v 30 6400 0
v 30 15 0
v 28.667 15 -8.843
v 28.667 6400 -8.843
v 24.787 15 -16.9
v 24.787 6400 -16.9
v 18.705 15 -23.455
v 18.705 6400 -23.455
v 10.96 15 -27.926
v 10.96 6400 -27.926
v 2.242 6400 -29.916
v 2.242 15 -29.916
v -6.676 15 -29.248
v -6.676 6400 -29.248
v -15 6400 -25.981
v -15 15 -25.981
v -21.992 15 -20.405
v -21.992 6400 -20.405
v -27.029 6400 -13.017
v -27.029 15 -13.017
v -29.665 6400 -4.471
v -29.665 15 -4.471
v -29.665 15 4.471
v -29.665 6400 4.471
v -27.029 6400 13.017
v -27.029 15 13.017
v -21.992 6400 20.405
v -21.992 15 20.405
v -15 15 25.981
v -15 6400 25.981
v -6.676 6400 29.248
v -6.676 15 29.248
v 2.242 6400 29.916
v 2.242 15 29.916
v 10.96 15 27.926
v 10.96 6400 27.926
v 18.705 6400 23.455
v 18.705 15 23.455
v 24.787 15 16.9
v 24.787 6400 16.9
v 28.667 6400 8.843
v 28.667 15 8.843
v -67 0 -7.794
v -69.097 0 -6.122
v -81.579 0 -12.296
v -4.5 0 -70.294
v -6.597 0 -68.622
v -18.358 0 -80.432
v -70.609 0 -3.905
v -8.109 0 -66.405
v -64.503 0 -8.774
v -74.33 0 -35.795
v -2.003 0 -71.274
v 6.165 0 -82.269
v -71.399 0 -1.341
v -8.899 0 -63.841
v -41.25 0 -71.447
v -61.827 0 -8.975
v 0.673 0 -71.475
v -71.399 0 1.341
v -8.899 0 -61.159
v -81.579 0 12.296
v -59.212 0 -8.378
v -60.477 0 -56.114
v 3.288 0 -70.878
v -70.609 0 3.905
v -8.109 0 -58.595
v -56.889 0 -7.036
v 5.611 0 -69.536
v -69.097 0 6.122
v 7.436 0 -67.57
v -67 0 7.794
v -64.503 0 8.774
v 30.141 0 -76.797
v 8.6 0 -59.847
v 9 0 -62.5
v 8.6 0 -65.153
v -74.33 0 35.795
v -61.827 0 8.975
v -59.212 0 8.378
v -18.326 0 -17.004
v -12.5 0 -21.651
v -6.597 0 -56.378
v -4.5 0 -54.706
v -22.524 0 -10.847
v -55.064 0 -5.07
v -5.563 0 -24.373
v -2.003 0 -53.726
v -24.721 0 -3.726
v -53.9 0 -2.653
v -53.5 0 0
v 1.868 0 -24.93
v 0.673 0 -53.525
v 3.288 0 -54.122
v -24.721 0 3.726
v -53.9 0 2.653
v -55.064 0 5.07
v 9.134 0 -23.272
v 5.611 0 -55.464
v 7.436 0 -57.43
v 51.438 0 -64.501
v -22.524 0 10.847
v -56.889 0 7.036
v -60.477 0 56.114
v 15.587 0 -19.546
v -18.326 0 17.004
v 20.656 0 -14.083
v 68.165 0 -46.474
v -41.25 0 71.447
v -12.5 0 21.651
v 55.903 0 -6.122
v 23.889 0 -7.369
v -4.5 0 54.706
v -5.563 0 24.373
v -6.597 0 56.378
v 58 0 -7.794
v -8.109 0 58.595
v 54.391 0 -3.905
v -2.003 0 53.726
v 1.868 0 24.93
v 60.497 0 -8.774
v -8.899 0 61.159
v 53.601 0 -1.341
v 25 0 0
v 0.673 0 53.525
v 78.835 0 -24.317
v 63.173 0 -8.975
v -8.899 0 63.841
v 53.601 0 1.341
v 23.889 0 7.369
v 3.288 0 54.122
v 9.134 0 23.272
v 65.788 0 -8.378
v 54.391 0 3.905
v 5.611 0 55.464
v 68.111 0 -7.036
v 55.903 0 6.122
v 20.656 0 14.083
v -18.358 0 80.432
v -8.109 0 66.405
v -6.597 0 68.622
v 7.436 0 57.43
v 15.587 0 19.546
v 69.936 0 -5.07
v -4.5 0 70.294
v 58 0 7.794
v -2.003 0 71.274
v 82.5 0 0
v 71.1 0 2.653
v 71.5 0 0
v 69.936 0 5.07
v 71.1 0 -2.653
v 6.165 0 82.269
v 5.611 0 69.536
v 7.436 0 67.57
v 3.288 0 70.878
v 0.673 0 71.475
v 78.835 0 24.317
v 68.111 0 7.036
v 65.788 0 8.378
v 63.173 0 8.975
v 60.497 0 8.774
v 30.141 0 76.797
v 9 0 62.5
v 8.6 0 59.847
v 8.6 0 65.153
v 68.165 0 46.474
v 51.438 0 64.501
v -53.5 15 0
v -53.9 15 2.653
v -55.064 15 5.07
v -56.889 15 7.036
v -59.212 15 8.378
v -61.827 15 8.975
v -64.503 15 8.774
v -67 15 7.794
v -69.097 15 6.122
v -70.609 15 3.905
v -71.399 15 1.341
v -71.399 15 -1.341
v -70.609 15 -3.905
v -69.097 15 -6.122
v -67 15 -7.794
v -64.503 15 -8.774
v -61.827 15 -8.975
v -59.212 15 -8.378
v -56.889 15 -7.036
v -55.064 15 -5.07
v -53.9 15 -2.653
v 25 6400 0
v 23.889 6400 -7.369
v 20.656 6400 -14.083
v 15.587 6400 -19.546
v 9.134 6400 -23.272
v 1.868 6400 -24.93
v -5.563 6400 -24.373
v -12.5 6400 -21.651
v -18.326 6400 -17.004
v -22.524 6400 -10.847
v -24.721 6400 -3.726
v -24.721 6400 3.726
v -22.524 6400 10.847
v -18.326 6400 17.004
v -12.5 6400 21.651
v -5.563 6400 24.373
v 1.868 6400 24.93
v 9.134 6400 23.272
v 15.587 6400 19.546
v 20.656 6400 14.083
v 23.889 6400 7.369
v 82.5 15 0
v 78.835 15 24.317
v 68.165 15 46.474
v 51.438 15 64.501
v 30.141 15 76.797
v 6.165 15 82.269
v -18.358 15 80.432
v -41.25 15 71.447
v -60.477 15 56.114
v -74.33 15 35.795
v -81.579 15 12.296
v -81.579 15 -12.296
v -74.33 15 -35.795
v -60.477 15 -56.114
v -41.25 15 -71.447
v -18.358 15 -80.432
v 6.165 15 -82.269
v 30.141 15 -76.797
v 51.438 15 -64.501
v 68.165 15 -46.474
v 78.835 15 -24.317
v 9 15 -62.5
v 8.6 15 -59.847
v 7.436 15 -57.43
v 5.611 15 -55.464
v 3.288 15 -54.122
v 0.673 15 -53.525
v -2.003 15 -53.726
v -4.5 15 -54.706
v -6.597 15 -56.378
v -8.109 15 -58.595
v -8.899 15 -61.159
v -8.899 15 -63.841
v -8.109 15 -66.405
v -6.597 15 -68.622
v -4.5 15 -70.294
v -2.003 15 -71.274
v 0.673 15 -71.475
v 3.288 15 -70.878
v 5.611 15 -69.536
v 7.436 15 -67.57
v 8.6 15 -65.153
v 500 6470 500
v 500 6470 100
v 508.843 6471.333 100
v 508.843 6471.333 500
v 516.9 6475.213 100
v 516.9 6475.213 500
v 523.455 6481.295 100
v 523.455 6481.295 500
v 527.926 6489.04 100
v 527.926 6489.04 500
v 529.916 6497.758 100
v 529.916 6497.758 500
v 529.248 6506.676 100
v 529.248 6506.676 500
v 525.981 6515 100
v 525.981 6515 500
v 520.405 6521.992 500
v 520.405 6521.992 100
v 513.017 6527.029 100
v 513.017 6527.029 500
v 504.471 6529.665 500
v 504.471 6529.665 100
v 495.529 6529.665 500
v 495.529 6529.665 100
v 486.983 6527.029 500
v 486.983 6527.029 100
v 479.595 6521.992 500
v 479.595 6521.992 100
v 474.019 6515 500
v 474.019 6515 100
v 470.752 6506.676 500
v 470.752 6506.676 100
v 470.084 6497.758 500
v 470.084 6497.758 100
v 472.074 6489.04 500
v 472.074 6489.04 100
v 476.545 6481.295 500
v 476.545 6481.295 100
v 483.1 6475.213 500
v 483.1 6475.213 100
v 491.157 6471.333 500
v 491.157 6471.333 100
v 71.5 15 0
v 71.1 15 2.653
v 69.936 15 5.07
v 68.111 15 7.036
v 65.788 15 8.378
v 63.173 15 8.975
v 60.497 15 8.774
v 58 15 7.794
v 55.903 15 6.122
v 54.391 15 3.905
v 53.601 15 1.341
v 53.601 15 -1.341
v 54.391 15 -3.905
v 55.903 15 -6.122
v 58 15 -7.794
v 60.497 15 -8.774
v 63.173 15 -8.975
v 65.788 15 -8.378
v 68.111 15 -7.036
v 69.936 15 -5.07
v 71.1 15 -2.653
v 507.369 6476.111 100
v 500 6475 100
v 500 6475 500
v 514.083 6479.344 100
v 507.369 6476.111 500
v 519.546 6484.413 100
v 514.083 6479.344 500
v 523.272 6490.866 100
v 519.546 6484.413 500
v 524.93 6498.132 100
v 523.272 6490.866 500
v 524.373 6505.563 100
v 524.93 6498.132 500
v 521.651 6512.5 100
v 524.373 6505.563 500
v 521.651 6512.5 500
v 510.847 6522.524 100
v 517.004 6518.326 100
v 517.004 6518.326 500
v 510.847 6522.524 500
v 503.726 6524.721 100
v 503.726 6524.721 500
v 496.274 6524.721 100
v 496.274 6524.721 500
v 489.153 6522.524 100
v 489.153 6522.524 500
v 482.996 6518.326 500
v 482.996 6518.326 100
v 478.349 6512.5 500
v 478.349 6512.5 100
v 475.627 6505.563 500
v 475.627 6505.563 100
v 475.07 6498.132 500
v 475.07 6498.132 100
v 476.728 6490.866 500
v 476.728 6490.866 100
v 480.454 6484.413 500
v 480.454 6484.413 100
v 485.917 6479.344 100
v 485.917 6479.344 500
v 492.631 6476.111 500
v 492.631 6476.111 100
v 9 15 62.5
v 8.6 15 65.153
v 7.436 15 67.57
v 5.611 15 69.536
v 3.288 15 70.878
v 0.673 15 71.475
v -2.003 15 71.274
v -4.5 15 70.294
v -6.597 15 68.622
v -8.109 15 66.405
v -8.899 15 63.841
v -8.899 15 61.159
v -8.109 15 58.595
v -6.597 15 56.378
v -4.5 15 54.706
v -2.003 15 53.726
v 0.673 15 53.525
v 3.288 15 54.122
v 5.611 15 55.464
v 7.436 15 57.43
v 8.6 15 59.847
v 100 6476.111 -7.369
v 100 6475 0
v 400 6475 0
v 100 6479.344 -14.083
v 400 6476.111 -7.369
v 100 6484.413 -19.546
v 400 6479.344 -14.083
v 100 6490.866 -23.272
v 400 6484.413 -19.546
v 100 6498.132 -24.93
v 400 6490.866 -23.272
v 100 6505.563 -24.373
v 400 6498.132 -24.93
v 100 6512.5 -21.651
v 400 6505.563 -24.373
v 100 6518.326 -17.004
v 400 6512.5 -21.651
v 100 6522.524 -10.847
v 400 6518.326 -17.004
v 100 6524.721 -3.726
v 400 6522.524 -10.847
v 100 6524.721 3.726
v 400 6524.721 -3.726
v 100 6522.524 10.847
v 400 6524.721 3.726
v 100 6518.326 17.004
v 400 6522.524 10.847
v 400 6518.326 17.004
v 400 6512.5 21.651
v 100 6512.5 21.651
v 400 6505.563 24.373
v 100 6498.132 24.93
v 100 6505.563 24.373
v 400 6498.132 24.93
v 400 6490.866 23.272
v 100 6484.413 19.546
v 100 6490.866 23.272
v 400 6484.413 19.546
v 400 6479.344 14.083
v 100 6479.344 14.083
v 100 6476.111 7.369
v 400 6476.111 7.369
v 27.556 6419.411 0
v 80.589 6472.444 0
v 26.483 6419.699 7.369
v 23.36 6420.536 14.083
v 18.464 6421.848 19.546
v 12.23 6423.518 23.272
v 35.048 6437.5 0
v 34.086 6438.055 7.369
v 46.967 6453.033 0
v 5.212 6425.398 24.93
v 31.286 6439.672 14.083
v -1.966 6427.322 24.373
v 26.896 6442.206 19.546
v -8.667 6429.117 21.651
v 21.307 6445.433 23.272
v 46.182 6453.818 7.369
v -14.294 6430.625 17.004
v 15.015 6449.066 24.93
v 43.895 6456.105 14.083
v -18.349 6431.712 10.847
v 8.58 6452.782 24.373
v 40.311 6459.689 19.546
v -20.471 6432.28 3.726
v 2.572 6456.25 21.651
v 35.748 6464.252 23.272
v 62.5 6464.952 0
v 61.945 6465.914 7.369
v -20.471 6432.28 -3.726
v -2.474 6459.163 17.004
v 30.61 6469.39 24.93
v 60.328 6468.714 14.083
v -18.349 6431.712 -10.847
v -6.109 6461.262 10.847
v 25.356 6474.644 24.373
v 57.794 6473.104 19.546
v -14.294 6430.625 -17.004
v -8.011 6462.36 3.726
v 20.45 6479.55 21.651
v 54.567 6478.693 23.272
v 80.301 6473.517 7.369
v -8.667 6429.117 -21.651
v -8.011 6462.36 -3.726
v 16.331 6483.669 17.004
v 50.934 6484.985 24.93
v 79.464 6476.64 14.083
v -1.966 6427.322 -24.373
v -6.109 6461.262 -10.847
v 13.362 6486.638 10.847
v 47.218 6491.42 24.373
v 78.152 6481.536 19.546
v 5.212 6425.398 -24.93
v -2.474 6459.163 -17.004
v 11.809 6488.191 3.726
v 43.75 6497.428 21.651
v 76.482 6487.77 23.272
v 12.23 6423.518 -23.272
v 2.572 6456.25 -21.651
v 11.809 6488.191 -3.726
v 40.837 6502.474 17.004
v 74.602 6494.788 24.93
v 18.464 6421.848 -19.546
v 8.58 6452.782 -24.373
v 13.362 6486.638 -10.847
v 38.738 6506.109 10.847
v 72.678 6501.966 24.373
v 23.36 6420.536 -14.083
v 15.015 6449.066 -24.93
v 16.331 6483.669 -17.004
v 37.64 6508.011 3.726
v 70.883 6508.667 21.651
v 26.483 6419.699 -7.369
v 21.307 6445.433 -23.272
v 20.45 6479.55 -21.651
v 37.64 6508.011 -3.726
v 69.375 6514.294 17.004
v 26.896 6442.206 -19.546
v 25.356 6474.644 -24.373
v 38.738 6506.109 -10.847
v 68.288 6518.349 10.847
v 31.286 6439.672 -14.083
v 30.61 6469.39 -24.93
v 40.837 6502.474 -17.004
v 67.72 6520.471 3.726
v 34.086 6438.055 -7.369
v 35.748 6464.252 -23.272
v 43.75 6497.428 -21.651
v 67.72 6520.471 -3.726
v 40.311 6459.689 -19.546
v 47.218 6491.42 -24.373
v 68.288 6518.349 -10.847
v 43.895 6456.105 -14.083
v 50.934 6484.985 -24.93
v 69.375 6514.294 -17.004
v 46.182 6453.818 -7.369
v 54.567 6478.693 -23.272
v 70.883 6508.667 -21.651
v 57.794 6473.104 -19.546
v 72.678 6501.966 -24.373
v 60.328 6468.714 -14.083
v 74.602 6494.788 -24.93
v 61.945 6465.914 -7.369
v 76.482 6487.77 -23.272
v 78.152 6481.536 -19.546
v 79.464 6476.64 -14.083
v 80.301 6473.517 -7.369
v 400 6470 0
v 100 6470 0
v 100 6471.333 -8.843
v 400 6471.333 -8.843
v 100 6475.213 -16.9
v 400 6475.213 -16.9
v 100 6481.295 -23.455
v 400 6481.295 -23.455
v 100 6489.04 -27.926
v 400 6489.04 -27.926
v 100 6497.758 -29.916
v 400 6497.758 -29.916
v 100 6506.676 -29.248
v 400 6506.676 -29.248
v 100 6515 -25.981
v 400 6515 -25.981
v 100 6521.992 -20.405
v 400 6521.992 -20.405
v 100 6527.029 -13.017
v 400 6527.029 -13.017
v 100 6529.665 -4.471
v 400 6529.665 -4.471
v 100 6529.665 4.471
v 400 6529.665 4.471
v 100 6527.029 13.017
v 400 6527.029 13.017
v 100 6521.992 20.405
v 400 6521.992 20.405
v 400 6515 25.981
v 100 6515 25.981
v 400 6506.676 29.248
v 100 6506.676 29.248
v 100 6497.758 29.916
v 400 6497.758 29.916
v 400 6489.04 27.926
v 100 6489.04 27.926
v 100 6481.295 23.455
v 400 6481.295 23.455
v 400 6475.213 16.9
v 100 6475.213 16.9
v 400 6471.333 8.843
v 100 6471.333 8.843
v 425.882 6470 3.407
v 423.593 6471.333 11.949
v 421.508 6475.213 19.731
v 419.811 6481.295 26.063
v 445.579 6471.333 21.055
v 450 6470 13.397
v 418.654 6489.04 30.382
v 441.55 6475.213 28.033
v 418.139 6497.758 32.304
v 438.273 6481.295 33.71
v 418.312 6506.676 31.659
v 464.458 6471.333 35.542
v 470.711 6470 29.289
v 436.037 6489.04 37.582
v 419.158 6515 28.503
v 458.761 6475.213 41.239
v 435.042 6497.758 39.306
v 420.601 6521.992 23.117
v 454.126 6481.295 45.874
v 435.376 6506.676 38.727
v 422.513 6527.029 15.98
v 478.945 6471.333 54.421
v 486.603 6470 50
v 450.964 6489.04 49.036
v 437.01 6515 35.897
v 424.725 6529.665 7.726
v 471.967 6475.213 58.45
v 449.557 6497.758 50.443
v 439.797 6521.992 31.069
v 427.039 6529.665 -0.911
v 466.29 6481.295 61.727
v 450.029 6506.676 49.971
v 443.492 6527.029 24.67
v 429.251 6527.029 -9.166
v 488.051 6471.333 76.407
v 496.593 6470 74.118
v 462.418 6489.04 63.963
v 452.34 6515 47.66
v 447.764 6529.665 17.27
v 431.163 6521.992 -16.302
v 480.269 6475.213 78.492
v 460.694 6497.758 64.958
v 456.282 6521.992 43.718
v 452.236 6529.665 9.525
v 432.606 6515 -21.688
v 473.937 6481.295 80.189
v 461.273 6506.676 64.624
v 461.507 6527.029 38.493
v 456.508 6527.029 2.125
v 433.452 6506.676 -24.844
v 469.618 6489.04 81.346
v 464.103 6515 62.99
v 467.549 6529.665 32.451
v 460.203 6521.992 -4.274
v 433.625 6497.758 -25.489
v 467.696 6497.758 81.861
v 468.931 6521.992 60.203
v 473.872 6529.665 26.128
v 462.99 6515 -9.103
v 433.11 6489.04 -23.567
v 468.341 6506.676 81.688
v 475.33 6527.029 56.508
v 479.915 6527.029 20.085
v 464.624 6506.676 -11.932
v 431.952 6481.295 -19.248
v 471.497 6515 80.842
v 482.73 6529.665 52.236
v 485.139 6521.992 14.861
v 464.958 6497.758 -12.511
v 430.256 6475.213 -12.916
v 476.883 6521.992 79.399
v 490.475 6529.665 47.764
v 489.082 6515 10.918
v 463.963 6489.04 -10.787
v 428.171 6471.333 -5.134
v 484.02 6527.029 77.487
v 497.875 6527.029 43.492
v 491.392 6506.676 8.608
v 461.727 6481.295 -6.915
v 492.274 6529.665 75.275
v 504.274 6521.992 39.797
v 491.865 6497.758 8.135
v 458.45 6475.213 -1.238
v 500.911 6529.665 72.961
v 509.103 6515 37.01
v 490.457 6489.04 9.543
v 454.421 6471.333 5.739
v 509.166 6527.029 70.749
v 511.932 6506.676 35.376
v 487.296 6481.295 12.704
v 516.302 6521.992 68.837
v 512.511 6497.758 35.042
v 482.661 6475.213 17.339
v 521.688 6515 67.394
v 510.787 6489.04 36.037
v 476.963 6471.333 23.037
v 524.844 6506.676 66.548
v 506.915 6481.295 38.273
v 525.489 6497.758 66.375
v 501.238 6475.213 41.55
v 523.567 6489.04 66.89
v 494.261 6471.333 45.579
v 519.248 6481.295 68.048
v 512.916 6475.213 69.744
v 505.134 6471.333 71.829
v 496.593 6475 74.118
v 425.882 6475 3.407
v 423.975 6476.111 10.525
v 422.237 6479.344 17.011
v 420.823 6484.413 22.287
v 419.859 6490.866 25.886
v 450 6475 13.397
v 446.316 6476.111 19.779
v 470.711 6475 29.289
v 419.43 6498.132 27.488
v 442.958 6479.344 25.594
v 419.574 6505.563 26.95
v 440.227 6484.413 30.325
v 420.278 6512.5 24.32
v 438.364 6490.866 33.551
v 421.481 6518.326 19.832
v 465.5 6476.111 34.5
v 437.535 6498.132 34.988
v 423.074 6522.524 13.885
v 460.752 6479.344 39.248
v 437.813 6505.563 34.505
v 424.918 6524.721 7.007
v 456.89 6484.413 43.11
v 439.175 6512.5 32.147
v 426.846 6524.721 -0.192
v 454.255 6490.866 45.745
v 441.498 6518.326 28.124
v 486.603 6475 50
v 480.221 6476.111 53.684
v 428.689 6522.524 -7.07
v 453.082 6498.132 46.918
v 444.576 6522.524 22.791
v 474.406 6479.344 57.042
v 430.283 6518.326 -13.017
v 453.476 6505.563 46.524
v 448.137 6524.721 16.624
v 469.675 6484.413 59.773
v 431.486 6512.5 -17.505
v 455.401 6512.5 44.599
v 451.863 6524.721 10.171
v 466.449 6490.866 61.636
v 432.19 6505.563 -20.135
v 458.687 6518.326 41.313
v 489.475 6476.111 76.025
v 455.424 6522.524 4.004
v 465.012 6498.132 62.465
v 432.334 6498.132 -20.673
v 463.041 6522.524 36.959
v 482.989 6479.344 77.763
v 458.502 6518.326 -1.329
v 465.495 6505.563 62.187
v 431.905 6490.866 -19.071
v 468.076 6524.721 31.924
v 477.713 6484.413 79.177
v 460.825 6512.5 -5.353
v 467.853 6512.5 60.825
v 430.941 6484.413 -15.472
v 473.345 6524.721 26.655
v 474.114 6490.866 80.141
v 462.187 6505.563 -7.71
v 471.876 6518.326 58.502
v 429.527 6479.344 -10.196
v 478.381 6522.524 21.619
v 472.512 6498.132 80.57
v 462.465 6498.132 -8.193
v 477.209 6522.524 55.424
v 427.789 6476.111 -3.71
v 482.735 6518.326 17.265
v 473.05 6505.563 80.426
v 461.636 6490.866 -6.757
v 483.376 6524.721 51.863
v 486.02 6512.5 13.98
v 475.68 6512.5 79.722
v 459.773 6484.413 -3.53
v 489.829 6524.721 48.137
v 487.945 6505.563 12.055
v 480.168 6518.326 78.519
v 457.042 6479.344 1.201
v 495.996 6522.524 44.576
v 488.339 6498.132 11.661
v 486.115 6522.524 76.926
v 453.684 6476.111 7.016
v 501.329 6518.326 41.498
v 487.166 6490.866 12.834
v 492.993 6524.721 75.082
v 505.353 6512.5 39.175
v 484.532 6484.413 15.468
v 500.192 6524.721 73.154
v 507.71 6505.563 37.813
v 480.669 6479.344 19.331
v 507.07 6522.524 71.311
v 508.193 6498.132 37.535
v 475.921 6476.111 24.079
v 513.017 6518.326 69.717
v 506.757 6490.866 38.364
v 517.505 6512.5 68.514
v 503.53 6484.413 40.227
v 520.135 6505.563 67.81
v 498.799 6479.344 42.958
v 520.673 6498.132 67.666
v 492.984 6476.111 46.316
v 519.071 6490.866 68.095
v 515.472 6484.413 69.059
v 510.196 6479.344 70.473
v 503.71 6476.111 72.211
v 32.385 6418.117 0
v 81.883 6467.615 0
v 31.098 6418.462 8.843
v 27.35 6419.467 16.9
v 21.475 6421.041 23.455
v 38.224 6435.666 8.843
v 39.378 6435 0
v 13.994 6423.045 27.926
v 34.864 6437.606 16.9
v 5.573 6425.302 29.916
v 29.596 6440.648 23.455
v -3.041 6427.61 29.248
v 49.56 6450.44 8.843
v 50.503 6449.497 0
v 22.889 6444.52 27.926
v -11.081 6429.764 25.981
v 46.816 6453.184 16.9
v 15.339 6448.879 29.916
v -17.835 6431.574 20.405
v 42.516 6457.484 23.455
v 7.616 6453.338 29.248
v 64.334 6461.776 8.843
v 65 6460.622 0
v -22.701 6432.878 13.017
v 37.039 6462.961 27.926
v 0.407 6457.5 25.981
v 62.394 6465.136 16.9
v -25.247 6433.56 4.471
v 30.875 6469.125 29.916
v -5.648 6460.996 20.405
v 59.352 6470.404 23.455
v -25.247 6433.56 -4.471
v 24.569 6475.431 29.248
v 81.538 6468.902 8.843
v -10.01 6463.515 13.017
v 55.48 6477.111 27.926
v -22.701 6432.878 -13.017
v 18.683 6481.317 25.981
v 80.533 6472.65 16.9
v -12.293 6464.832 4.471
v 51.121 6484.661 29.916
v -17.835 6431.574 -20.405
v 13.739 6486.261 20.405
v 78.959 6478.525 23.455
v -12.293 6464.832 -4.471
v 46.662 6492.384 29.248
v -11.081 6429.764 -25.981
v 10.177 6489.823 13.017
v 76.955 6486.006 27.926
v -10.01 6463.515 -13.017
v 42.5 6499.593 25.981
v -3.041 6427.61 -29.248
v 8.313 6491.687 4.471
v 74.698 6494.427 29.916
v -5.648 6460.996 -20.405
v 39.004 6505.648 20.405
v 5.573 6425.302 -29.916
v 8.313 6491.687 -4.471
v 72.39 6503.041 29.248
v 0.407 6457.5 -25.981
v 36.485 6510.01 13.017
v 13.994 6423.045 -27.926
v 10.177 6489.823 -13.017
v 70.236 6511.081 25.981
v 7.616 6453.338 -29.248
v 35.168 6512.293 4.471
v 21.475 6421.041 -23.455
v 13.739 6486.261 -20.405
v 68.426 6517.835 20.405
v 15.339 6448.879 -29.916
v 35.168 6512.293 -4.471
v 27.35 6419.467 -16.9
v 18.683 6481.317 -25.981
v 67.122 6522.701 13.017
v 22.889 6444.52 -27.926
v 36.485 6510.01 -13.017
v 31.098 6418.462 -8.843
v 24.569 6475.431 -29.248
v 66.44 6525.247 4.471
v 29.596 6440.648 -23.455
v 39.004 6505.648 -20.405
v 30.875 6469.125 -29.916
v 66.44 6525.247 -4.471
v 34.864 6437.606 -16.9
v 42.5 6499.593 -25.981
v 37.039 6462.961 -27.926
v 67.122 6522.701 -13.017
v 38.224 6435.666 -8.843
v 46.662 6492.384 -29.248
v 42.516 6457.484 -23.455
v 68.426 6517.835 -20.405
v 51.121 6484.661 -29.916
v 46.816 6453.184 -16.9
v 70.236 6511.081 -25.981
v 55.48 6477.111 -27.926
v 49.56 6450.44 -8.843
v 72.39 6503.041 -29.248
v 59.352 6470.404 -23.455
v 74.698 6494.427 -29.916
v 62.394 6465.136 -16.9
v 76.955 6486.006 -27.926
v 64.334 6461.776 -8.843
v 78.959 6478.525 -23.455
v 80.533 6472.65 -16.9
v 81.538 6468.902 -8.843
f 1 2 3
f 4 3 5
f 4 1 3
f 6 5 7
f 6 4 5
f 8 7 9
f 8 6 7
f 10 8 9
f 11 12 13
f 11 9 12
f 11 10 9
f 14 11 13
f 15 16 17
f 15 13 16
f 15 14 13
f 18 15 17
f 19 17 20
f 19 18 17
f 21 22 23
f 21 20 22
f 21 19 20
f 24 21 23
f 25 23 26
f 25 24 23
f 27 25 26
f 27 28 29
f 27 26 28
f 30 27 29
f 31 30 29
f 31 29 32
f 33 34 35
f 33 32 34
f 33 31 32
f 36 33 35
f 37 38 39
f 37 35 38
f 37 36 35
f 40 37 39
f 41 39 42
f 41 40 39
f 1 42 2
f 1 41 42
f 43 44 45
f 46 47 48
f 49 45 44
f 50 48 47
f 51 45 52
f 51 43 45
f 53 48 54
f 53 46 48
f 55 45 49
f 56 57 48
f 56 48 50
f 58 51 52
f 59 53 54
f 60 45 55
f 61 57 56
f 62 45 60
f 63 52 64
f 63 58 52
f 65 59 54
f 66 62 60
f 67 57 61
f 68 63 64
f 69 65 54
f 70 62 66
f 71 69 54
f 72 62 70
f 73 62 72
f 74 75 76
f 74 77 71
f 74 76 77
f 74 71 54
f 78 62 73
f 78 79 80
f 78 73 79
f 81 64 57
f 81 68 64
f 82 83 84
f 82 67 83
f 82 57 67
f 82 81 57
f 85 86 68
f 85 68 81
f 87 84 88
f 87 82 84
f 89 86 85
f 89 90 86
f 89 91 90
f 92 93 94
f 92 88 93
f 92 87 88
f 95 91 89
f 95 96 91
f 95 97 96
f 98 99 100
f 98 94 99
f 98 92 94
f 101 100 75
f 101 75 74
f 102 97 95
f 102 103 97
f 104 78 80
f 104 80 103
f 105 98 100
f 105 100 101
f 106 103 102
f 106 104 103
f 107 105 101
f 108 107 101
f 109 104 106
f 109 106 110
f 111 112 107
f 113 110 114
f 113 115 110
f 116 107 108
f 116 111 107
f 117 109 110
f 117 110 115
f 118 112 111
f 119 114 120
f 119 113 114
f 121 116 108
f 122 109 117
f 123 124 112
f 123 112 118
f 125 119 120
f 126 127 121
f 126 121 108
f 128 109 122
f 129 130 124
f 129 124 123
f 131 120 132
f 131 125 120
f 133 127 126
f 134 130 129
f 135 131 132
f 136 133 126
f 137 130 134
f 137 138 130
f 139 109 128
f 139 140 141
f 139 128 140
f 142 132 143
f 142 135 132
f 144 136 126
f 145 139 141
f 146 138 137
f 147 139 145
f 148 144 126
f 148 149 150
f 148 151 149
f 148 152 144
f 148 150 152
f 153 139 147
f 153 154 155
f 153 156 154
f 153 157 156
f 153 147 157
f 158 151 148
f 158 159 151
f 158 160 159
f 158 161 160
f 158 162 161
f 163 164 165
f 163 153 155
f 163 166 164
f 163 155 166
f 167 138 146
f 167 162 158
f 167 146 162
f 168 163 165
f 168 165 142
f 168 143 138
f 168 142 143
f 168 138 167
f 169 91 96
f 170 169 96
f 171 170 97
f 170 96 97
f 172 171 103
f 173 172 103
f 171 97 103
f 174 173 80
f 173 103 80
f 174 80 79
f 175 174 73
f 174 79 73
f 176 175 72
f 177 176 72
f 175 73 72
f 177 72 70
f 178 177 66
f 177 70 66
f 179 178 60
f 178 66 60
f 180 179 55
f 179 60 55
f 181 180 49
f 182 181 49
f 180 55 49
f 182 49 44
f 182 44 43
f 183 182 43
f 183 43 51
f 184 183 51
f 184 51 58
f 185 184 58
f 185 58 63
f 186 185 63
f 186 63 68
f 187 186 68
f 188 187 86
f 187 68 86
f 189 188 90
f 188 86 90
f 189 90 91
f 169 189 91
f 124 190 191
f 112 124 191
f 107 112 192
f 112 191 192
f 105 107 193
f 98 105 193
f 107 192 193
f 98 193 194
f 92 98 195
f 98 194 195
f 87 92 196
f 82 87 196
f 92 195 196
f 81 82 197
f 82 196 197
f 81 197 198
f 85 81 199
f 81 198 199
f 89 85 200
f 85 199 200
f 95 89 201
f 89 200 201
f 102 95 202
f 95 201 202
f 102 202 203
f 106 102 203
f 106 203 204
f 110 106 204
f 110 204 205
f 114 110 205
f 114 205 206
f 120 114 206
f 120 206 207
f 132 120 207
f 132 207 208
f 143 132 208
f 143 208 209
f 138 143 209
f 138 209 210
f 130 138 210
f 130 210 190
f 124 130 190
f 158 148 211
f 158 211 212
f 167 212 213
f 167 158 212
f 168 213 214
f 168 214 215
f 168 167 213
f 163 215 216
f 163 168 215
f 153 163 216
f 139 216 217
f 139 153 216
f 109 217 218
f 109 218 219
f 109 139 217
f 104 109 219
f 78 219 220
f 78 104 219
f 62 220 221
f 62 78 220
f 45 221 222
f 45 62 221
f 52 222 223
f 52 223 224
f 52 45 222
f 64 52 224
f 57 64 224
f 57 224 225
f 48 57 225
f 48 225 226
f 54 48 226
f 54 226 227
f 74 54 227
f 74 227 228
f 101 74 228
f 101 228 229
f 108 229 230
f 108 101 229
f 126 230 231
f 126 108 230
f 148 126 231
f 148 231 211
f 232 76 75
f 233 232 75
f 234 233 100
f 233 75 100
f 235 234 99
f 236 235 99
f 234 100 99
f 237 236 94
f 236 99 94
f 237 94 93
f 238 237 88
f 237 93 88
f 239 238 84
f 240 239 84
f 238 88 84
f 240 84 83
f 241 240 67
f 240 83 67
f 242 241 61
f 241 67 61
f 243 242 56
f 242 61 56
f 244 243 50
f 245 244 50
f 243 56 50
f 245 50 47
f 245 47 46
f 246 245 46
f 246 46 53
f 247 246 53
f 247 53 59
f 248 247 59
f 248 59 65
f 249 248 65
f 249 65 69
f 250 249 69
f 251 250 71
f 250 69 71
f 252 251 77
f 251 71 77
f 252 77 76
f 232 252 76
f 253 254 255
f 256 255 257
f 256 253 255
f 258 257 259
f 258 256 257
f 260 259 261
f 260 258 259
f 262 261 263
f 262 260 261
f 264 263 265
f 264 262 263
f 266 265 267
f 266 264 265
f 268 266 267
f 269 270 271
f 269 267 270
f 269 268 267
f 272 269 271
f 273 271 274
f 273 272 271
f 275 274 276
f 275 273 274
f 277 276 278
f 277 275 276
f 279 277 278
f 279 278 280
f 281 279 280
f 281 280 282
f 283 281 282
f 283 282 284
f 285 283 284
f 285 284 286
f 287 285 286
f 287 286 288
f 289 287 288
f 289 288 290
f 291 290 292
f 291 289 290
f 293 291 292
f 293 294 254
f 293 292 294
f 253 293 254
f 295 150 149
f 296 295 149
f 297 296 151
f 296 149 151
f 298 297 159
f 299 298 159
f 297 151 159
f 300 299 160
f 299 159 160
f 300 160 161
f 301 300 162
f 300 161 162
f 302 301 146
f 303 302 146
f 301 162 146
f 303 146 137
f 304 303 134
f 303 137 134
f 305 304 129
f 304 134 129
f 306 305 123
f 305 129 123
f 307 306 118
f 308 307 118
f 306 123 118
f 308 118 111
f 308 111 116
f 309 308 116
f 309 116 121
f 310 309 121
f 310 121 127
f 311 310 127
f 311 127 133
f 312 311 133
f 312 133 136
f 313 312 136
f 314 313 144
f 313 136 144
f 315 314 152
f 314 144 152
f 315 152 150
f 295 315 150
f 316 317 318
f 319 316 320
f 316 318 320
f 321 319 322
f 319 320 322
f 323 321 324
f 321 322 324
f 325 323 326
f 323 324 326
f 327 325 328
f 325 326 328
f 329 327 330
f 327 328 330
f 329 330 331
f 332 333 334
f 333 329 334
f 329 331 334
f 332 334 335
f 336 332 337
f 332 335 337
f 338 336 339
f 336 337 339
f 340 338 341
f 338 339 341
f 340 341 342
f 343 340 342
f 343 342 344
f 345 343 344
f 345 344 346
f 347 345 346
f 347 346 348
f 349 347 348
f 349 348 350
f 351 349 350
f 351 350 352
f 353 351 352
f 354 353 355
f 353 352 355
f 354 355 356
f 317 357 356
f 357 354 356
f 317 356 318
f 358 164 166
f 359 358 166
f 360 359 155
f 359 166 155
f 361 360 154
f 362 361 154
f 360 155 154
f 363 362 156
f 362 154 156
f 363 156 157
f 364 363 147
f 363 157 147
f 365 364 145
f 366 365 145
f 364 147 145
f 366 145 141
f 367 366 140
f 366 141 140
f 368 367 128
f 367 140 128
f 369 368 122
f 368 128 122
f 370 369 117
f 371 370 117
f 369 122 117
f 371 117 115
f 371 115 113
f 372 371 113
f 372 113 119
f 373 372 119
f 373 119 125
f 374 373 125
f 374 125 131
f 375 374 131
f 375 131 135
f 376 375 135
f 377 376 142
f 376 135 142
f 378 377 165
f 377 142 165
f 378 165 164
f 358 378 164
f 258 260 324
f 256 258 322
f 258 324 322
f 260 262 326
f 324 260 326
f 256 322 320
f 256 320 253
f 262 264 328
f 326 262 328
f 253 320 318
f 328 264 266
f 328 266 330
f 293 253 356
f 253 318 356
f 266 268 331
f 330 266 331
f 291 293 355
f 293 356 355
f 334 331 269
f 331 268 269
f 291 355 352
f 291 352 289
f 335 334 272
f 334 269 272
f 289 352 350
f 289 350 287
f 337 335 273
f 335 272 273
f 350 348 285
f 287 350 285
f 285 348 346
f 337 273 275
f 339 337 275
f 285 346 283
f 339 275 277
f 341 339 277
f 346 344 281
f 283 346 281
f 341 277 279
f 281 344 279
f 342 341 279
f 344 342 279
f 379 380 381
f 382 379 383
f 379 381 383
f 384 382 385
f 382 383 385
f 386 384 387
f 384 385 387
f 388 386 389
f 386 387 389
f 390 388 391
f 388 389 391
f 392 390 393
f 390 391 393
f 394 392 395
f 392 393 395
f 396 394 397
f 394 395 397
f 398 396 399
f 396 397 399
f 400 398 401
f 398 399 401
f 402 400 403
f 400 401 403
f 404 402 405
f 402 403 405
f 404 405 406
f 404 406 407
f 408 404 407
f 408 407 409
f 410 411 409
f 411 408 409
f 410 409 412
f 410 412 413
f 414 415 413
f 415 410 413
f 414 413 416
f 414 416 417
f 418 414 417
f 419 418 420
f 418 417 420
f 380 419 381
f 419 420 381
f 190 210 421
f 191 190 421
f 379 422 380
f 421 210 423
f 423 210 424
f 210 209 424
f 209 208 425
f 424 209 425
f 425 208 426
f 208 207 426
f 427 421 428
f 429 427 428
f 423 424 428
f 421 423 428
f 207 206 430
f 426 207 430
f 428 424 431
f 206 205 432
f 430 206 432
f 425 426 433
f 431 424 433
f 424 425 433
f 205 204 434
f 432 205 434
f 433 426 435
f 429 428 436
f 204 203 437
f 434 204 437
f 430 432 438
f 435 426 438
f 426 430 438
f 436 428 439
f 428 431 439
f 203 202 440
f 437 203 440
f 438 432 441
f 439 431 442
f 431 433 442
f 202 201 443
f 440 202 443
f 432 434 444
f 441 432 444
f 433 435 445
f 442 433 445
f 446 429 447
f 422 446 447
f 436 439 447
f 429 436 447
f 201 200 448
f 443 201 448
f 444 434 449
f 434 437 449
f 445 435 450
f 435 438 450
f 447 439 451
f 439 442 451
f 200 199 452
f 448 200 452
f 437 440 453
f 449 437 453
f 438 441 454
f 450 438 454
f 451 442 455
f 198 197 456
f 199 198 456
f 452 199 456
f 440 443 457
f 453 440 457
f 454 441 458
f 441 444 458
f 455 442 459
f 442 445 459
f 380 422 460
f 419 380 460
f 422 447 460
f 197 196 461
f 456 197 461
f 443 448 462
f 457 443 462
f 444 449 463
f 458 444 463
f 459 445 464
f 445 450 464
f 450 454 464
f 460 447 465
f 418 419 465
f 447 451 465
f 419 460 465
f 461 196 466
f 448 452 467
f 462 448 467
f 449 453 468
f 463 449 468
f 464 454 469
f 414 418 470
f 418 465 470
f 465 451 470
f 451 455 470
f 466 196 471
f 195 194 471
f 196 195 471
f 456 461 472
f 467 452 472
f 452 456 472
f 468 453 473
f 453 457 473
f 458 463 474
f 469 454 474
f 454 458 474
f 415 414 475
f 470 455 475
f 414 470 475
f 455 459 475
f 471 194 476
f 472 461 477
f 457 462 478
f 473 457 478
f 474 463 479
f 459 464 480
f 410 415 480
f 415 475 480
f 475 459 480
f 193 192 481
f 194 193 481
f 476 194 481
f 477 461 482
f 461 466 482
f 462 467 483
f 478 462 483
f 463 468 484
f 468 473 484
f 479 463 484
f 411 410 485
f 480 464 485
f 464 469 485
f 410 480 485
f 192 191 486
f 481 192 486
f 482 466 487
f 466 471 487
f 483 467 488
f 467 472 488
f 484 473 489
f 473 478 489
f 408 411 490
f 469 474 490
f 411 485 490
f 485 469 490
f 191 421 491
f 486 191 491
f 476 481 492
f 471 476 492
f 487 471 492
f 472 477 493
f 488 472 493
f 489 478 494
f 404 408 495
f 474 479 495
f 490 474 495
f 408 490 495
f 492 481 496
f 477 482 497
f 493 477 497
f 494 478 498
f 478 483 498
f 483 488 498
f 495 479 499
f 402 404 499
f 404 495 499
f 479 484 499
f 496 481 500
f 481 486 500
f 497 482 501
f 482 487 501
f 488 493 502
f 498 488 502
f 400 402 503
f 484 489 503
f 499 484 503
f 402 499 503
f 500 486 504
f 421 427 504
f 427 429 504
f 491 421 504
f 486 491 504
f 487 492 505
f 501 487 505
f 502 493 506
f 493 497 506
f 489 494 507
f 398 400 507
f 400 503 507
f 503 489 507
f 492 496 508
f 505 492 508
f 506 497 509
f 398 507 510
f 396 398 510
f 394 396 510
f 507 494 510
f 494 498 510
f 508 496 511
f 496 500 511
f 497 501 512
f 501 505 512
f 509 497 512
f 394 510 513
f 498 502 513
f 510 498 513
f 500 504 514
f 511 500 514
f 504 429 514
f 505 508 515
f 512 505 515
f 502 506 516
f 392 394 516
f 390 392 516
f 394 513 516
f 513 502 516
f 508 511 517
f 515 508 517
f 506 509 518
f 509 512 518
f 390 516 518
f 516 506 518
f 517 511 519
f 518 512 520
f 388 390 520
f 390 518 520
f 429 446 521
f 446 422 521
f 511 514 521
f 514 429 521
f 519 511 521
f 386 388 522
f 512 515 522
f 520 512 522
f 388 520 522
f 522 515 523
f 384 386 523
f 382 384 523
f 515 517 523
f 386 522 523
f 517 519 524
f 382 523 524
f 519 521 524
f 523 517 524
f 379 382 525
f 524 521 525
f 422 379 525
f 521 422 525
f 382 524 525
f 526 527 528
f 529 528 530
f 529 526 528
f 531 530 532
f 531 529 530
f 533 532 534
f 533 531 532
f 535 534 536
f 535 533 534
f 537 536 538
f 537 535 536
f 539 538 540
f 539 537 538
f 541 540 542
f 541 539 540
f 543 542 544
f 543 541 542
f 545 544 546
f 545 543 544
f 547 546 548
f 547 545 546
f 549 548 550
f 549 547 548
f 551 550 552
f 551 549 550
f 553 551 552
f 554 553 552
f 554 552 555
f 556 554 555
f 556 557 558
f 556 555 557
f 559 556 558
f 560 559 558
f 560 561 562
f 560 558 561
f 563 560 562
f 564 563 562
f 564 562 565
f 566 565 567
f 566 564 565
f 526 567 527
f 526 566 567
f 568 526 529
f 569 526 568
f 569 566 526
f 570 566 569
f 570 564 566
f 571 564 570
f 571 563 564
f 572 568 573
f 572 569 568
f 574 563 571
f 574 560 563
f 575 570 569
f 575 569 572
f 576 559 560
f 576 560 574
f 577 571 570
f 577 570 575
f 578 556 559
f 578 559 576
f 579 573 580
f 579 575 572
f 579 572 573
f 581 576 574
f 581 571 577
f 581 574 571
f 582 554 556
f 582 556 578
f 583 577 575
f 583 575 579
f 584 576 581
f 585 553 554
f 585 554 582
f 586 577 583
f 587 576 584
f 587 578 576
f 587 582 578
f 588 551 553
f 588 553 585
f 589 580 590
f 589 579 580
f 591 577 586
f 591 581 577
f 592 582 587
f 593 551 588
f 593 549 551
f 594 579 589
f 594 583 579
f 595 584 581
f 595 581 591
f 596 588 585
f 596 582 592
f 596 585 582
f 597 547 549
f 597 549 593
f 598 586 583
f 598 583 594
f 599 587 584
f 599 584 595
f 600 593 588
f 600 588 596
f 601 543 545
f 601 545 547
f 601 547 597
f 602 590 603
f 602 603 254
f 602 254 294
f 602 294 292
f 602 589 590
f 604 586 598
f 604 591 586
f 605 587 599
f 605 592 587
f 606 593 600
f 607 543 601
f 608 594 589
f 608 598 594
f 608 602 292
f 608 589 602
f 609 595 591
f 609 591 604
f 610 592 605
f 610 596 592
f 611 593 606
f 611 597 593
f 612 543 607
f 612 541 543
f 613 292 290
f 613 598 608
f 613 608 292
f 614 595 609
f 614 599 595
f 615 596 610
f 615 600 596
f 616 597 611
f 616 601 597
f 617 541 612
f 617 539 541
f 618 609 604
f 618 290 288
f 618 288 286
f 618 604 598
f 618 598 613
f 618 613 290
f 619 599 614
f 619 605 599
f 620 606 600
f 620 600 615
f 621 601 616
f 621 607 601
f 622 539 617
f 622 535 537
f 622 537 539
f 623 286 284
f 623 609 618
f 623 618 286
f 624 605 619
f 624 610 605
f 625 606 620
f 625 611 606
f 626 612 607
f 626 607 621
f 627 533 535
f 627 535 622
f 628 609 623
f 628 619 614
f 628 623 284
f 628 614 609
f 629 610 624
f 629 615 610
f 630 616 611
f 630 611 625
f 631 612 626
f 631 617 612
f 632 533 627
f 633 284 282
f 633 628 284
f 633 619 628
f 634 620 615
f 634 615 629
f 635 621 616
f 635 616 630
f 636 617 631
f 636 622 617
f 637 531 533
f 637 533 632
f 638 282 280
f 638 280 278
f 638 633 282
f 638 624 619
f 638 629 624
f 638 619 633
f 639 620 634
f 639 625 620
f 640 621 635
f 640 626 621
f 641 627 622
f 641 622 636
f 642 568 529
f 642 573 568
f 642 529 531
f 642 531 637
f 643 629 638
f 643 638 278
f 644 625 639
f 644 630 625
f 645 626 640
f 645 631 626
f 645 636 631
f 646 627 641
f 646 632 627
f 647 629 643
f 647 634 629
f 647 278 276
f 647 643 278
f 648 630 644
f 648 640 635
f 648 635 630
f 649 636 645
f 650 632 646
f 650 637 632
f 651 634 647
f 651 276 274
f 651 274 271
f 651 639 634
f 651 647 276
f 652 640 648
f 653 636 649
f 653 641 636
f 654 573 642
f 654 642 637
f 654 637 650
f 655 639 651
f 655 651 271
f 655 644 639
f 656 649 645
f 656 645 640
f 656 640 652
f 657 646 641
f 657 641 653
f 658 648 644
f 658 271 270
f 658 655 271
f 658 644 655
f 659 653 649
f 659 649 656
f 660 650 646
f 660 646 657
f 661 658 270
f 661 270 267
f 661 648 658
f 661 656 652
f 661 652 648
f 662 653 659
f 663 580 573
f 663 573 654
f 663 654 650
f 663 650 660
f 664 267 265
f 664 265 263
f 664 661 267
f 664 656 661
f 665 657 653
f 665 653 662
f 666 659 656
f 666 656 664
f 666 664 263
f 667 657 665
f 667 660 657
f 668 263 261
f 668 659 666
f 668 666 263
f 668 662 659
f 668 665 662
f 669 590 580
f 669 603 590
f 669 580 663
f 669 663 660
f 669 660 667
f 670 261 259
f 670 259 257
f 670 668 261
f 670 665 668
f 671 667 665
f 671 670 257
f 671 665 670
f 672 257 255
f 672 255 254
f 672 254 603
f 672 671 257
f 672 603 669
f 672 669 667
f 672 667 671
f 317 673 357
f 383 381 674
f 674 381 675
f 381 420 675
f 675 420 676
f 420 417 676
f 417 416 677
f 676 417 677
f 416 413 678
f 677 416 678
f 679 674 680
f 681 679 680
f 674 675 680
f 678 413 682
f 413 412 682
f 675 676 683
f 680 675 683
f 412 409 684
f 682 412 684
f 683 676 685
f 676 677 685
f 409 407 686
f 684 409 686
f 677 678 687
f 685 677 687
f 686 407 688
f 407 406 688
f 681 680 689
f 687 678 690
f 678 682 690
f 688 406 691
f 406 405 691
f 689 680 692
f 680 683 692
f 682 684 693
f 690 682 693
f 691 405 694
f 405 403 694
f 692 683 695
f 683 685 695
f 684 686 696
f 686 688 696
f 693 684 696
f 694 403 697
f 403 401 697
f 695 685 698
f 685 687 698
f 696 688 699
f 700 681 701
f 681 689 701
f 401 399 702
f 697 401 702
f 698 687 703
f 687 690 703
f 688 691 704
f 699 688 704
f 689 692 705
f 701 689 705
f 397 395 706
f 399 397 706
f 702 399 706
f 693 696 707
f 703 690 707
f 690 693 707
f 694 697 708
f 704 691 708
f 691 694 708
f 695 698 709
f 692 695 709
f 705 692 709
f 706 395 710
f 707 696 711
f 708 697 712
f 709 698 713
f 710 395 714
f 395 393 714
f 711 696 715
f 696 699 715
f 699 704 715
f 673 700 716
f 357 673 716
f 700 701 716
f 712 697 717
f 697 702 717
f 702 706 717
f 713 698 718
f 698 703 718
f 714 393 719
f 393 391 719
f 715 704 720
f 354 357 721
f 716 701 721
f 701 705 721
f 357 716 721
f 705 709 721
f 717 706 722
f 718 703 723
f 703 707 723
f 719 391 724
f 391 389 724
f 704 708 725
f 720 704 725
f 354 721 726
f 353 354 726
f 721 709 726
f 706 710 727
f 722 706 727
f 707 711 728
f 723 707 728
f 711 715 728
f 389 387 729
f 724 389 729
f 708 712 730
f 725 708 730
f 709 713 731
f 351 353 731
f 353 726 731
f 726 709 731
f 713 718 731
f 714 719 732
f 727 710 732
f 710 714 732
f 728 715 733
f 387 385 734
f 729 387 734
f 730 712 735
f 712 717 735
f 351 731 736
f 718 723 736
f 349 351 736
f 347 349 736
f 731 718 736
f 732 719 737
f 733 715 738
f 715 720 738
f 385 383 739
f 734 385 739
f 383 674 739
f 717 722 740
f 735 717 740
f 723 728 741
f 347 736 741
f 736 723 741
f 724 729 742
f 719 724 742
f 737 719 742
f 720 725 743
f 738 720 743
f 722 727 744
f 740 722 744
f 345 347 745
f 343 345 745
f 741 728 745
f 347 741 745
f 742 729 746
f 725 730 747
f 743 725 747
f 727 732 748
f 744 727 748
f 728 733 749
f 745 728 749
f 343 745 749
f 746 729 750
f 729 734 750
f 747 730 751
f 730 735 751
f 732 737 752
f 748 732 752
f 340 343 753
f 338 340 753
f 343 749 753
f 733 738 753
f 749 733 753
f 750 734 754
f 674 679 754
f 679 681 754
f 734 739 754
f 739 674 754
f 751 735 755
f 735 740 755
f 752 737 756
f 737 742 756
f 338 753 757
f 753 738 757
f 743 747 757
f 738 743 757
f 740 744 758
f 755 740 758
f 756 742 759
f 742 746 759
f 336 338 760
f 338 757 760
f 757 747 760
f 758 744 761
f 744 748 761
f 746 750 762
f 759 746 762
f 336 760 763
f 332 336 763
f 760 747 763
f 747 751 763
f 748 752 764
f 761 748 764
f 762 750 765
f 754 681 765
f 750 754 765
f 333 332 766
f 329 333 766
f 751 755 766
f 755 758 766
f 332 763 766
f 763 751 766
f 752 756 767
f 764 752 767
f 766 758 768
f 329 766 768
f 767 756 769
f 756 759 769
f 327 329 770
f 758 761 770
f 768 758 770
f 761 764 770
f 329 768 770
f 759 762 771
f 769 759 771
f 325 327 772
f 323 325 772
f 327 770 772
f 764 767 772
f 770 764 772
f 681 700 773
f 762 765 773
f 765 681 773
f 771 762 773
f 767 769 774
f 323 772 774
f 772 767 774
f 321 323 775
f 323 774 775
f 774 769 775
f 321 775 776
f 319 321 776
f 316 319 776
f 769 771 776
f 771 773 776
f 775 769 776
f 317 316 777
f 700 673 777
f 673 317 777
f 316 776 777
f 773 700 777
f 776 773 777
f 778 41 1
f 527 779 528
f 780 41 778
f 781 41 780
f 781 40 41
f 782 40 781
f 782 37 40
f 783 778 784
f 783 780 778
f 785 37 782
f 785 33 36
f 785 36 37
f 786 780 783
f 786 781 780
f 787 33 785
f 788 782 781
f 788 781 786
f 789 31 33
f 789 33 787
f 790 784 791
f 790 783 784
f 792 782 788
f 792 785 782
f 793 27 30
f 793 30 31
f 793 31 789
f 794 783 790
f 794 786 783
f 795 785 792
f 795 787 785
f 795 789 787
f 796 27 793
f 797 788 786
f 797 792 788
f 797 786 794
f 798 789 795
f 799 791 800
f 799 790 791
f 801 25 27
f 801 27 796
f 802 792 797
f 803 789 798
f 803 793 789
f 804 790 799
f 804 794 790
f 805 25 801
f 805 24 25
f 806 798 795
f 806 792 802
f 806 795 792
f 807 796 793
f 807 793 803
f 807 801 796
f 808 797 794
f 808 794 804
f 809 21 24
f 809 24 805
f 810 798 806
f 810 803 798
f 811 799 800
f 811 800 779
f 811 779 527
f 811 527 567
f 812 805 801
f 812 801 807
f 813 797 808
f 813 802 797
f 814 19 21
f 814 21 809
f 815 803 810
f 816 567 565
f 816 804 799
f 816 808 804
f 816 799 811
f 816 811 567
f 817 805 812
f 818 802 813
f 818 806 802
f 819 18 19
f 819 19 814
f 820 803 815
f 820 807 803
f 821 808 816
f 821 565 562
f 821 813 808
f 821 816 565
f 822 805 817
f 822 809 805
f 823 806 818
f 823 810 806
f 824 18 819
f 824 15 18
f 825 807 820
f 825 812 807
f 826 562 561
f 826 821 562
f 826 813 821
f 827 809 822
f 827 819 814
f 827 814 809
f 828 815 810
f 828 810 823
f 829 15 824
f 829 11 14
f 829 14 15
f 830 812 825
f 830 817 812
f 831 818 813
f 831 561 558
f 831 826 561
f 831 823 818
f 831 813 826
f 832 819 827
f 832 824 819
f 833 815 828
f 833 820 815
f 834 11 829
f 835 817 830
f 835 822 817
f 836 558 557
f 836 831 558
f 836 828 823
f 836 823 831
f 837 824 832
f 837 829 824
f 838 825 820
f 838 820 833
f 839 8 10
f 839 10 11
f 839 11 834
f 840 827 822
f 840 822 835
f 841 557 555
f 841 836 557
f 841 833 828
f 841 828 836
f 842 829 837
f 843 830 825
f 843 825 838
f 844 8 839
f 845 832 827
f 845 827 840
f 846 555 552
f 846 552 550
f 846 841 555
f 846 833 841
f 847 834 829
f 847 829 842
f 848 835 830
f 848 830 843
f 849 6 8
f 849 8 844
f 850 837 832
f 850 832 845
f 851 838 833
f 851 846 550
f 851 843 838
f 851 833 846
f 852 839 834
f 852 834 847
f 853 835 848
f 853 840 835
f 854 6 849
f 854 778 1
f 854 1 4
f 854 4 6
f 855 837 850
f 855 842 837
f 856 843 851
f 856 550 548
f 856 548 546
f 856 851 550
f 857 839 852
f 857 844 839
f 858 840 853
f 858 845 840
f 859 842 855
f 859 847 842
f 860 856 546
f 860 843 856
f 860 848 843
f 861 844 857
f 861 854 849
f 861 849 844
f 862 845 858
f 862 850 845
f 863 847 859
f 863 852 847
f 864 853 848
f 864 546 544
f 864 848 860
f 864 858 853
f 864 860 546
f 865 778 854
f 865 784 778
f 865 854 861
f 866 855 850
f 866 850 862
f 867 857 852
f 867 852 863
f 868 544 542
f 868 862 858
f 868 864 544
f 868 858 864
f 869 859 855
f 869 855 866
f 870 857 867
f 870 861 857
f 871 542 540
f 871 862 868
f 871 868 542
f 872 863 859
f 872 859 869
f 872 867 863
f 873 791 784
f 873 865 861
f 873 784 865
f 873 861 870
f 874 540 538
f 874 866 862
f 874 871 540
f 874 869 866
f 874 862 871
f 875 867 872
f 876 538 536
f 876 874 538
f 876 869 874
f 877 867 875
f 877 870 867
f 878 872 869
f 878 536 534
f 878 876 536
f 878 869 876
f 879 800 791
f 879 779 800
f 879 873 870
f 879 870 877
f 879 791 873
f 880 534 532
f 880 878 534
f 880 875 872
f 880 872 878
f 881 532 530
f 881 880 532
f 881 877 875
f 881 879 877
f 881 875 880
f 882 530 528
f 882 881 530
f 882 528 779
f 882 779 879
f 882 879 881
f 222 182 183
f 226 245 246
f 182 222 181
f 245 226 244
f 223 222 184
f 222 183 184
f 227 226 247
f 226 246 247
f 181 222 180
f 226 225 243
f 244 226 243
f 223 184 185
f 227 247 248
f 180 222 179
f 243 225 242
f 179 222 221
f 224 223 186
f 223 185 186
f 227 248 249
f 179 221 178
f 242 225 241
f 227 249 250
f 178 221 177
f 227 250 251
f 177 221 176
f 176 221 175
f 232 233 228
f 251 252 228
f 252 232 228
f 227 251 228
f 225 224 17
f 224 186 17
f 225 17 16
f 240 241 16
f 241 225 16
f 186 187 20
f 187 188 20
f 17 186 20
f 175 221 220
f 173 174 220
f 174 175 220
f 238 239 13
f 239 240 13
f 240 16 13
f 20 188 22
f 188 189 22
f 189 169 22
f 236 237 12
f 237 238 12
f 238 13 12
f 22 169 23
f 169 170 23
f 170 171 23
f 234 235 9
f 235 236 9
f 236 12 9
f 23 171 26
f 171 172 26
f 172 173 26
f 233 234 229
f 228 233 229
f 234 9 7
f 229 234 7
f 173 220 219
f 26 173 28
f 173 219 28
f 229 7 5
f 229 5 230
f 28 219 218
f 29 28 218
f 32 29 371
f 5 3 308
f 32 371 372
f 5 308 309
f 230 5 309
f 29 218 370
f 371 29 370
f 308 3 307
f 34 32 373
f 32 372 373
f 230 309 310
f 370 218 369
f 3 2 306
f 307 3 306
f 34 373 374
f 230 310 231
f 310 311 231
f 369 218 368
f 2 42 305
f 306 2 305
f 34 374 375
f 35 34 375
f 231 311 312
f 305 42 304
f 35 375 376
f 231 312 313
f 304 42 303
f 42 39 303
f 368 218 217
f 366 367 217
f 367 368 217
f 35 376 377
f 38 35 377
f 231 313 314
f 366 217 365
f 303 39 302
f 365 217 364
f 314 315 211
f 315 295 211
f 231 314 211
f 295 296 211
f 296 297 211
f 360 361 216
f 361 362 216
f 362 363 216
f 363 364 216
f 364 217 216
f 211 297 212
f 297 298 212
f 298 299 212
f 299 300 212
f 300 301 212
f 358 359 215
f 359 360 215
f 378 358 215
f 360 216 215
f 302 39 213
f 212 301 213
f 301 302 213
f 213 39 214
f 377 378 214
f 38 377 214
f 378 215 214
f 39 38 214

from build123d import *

# Parameters (mm, degrees)
F0_R     = 30
F0_R_2   = 25
F0_R_3   = 82.5
F0_R_4   = 9
F5_DEPTH = 15


with BuildPart() as f4:
    # F4: sweep along a path in F1, F3
    with BuildLine(Plane.XY) as f4_path:
        Line((0, 0), (0, 6400))
        ThreePointArc((0, 6400), (29.2893218813, 6470.7106781187), (100, 6500))
    with BuildLine(Plane.XZ.offset(-6500)) as f4_path_2:
        Line((100, 0), (400, 0))
        ThreePointArc((400, 0), (470.7106781187, 29.2893218813), (500, 100))
        Line((500, 100), (500, 500))
    # F0 (on Front) → F4 (sweep)
    with BuildSketch(Plane.XZ):
        Circle(F0_R)
        Circle(F0_R_2, mode=Mode.SUBTRACT)
    sweep(path=f4_path.line + f4_path_2.line)

    # F0 (on Front) → F5 (join)
    with BuildSketch(Plane.XZ):
        Circle(F0_R_3)
        with Locations((0, -62.5)):
            Circle(F0_R_4, mode=Mode.SUBTRACT)
        with Locations((-62.5, 0)):
            Circle(F0_R_4, mode=Mode.SUBTRACT)
        Circle(F0_R, mode=Mode.SUBTRACT)
        with Locations((62.5, 0)):
            Circle(F0_R_4, mode=Mode.SUBTRACT)
        with Locations((0, 62.5)):
            Circle(F0_R_4, mode=Mode.SUBTRACT)
    extrude(amount=-F5_DEPTH)


solid = f4.part
